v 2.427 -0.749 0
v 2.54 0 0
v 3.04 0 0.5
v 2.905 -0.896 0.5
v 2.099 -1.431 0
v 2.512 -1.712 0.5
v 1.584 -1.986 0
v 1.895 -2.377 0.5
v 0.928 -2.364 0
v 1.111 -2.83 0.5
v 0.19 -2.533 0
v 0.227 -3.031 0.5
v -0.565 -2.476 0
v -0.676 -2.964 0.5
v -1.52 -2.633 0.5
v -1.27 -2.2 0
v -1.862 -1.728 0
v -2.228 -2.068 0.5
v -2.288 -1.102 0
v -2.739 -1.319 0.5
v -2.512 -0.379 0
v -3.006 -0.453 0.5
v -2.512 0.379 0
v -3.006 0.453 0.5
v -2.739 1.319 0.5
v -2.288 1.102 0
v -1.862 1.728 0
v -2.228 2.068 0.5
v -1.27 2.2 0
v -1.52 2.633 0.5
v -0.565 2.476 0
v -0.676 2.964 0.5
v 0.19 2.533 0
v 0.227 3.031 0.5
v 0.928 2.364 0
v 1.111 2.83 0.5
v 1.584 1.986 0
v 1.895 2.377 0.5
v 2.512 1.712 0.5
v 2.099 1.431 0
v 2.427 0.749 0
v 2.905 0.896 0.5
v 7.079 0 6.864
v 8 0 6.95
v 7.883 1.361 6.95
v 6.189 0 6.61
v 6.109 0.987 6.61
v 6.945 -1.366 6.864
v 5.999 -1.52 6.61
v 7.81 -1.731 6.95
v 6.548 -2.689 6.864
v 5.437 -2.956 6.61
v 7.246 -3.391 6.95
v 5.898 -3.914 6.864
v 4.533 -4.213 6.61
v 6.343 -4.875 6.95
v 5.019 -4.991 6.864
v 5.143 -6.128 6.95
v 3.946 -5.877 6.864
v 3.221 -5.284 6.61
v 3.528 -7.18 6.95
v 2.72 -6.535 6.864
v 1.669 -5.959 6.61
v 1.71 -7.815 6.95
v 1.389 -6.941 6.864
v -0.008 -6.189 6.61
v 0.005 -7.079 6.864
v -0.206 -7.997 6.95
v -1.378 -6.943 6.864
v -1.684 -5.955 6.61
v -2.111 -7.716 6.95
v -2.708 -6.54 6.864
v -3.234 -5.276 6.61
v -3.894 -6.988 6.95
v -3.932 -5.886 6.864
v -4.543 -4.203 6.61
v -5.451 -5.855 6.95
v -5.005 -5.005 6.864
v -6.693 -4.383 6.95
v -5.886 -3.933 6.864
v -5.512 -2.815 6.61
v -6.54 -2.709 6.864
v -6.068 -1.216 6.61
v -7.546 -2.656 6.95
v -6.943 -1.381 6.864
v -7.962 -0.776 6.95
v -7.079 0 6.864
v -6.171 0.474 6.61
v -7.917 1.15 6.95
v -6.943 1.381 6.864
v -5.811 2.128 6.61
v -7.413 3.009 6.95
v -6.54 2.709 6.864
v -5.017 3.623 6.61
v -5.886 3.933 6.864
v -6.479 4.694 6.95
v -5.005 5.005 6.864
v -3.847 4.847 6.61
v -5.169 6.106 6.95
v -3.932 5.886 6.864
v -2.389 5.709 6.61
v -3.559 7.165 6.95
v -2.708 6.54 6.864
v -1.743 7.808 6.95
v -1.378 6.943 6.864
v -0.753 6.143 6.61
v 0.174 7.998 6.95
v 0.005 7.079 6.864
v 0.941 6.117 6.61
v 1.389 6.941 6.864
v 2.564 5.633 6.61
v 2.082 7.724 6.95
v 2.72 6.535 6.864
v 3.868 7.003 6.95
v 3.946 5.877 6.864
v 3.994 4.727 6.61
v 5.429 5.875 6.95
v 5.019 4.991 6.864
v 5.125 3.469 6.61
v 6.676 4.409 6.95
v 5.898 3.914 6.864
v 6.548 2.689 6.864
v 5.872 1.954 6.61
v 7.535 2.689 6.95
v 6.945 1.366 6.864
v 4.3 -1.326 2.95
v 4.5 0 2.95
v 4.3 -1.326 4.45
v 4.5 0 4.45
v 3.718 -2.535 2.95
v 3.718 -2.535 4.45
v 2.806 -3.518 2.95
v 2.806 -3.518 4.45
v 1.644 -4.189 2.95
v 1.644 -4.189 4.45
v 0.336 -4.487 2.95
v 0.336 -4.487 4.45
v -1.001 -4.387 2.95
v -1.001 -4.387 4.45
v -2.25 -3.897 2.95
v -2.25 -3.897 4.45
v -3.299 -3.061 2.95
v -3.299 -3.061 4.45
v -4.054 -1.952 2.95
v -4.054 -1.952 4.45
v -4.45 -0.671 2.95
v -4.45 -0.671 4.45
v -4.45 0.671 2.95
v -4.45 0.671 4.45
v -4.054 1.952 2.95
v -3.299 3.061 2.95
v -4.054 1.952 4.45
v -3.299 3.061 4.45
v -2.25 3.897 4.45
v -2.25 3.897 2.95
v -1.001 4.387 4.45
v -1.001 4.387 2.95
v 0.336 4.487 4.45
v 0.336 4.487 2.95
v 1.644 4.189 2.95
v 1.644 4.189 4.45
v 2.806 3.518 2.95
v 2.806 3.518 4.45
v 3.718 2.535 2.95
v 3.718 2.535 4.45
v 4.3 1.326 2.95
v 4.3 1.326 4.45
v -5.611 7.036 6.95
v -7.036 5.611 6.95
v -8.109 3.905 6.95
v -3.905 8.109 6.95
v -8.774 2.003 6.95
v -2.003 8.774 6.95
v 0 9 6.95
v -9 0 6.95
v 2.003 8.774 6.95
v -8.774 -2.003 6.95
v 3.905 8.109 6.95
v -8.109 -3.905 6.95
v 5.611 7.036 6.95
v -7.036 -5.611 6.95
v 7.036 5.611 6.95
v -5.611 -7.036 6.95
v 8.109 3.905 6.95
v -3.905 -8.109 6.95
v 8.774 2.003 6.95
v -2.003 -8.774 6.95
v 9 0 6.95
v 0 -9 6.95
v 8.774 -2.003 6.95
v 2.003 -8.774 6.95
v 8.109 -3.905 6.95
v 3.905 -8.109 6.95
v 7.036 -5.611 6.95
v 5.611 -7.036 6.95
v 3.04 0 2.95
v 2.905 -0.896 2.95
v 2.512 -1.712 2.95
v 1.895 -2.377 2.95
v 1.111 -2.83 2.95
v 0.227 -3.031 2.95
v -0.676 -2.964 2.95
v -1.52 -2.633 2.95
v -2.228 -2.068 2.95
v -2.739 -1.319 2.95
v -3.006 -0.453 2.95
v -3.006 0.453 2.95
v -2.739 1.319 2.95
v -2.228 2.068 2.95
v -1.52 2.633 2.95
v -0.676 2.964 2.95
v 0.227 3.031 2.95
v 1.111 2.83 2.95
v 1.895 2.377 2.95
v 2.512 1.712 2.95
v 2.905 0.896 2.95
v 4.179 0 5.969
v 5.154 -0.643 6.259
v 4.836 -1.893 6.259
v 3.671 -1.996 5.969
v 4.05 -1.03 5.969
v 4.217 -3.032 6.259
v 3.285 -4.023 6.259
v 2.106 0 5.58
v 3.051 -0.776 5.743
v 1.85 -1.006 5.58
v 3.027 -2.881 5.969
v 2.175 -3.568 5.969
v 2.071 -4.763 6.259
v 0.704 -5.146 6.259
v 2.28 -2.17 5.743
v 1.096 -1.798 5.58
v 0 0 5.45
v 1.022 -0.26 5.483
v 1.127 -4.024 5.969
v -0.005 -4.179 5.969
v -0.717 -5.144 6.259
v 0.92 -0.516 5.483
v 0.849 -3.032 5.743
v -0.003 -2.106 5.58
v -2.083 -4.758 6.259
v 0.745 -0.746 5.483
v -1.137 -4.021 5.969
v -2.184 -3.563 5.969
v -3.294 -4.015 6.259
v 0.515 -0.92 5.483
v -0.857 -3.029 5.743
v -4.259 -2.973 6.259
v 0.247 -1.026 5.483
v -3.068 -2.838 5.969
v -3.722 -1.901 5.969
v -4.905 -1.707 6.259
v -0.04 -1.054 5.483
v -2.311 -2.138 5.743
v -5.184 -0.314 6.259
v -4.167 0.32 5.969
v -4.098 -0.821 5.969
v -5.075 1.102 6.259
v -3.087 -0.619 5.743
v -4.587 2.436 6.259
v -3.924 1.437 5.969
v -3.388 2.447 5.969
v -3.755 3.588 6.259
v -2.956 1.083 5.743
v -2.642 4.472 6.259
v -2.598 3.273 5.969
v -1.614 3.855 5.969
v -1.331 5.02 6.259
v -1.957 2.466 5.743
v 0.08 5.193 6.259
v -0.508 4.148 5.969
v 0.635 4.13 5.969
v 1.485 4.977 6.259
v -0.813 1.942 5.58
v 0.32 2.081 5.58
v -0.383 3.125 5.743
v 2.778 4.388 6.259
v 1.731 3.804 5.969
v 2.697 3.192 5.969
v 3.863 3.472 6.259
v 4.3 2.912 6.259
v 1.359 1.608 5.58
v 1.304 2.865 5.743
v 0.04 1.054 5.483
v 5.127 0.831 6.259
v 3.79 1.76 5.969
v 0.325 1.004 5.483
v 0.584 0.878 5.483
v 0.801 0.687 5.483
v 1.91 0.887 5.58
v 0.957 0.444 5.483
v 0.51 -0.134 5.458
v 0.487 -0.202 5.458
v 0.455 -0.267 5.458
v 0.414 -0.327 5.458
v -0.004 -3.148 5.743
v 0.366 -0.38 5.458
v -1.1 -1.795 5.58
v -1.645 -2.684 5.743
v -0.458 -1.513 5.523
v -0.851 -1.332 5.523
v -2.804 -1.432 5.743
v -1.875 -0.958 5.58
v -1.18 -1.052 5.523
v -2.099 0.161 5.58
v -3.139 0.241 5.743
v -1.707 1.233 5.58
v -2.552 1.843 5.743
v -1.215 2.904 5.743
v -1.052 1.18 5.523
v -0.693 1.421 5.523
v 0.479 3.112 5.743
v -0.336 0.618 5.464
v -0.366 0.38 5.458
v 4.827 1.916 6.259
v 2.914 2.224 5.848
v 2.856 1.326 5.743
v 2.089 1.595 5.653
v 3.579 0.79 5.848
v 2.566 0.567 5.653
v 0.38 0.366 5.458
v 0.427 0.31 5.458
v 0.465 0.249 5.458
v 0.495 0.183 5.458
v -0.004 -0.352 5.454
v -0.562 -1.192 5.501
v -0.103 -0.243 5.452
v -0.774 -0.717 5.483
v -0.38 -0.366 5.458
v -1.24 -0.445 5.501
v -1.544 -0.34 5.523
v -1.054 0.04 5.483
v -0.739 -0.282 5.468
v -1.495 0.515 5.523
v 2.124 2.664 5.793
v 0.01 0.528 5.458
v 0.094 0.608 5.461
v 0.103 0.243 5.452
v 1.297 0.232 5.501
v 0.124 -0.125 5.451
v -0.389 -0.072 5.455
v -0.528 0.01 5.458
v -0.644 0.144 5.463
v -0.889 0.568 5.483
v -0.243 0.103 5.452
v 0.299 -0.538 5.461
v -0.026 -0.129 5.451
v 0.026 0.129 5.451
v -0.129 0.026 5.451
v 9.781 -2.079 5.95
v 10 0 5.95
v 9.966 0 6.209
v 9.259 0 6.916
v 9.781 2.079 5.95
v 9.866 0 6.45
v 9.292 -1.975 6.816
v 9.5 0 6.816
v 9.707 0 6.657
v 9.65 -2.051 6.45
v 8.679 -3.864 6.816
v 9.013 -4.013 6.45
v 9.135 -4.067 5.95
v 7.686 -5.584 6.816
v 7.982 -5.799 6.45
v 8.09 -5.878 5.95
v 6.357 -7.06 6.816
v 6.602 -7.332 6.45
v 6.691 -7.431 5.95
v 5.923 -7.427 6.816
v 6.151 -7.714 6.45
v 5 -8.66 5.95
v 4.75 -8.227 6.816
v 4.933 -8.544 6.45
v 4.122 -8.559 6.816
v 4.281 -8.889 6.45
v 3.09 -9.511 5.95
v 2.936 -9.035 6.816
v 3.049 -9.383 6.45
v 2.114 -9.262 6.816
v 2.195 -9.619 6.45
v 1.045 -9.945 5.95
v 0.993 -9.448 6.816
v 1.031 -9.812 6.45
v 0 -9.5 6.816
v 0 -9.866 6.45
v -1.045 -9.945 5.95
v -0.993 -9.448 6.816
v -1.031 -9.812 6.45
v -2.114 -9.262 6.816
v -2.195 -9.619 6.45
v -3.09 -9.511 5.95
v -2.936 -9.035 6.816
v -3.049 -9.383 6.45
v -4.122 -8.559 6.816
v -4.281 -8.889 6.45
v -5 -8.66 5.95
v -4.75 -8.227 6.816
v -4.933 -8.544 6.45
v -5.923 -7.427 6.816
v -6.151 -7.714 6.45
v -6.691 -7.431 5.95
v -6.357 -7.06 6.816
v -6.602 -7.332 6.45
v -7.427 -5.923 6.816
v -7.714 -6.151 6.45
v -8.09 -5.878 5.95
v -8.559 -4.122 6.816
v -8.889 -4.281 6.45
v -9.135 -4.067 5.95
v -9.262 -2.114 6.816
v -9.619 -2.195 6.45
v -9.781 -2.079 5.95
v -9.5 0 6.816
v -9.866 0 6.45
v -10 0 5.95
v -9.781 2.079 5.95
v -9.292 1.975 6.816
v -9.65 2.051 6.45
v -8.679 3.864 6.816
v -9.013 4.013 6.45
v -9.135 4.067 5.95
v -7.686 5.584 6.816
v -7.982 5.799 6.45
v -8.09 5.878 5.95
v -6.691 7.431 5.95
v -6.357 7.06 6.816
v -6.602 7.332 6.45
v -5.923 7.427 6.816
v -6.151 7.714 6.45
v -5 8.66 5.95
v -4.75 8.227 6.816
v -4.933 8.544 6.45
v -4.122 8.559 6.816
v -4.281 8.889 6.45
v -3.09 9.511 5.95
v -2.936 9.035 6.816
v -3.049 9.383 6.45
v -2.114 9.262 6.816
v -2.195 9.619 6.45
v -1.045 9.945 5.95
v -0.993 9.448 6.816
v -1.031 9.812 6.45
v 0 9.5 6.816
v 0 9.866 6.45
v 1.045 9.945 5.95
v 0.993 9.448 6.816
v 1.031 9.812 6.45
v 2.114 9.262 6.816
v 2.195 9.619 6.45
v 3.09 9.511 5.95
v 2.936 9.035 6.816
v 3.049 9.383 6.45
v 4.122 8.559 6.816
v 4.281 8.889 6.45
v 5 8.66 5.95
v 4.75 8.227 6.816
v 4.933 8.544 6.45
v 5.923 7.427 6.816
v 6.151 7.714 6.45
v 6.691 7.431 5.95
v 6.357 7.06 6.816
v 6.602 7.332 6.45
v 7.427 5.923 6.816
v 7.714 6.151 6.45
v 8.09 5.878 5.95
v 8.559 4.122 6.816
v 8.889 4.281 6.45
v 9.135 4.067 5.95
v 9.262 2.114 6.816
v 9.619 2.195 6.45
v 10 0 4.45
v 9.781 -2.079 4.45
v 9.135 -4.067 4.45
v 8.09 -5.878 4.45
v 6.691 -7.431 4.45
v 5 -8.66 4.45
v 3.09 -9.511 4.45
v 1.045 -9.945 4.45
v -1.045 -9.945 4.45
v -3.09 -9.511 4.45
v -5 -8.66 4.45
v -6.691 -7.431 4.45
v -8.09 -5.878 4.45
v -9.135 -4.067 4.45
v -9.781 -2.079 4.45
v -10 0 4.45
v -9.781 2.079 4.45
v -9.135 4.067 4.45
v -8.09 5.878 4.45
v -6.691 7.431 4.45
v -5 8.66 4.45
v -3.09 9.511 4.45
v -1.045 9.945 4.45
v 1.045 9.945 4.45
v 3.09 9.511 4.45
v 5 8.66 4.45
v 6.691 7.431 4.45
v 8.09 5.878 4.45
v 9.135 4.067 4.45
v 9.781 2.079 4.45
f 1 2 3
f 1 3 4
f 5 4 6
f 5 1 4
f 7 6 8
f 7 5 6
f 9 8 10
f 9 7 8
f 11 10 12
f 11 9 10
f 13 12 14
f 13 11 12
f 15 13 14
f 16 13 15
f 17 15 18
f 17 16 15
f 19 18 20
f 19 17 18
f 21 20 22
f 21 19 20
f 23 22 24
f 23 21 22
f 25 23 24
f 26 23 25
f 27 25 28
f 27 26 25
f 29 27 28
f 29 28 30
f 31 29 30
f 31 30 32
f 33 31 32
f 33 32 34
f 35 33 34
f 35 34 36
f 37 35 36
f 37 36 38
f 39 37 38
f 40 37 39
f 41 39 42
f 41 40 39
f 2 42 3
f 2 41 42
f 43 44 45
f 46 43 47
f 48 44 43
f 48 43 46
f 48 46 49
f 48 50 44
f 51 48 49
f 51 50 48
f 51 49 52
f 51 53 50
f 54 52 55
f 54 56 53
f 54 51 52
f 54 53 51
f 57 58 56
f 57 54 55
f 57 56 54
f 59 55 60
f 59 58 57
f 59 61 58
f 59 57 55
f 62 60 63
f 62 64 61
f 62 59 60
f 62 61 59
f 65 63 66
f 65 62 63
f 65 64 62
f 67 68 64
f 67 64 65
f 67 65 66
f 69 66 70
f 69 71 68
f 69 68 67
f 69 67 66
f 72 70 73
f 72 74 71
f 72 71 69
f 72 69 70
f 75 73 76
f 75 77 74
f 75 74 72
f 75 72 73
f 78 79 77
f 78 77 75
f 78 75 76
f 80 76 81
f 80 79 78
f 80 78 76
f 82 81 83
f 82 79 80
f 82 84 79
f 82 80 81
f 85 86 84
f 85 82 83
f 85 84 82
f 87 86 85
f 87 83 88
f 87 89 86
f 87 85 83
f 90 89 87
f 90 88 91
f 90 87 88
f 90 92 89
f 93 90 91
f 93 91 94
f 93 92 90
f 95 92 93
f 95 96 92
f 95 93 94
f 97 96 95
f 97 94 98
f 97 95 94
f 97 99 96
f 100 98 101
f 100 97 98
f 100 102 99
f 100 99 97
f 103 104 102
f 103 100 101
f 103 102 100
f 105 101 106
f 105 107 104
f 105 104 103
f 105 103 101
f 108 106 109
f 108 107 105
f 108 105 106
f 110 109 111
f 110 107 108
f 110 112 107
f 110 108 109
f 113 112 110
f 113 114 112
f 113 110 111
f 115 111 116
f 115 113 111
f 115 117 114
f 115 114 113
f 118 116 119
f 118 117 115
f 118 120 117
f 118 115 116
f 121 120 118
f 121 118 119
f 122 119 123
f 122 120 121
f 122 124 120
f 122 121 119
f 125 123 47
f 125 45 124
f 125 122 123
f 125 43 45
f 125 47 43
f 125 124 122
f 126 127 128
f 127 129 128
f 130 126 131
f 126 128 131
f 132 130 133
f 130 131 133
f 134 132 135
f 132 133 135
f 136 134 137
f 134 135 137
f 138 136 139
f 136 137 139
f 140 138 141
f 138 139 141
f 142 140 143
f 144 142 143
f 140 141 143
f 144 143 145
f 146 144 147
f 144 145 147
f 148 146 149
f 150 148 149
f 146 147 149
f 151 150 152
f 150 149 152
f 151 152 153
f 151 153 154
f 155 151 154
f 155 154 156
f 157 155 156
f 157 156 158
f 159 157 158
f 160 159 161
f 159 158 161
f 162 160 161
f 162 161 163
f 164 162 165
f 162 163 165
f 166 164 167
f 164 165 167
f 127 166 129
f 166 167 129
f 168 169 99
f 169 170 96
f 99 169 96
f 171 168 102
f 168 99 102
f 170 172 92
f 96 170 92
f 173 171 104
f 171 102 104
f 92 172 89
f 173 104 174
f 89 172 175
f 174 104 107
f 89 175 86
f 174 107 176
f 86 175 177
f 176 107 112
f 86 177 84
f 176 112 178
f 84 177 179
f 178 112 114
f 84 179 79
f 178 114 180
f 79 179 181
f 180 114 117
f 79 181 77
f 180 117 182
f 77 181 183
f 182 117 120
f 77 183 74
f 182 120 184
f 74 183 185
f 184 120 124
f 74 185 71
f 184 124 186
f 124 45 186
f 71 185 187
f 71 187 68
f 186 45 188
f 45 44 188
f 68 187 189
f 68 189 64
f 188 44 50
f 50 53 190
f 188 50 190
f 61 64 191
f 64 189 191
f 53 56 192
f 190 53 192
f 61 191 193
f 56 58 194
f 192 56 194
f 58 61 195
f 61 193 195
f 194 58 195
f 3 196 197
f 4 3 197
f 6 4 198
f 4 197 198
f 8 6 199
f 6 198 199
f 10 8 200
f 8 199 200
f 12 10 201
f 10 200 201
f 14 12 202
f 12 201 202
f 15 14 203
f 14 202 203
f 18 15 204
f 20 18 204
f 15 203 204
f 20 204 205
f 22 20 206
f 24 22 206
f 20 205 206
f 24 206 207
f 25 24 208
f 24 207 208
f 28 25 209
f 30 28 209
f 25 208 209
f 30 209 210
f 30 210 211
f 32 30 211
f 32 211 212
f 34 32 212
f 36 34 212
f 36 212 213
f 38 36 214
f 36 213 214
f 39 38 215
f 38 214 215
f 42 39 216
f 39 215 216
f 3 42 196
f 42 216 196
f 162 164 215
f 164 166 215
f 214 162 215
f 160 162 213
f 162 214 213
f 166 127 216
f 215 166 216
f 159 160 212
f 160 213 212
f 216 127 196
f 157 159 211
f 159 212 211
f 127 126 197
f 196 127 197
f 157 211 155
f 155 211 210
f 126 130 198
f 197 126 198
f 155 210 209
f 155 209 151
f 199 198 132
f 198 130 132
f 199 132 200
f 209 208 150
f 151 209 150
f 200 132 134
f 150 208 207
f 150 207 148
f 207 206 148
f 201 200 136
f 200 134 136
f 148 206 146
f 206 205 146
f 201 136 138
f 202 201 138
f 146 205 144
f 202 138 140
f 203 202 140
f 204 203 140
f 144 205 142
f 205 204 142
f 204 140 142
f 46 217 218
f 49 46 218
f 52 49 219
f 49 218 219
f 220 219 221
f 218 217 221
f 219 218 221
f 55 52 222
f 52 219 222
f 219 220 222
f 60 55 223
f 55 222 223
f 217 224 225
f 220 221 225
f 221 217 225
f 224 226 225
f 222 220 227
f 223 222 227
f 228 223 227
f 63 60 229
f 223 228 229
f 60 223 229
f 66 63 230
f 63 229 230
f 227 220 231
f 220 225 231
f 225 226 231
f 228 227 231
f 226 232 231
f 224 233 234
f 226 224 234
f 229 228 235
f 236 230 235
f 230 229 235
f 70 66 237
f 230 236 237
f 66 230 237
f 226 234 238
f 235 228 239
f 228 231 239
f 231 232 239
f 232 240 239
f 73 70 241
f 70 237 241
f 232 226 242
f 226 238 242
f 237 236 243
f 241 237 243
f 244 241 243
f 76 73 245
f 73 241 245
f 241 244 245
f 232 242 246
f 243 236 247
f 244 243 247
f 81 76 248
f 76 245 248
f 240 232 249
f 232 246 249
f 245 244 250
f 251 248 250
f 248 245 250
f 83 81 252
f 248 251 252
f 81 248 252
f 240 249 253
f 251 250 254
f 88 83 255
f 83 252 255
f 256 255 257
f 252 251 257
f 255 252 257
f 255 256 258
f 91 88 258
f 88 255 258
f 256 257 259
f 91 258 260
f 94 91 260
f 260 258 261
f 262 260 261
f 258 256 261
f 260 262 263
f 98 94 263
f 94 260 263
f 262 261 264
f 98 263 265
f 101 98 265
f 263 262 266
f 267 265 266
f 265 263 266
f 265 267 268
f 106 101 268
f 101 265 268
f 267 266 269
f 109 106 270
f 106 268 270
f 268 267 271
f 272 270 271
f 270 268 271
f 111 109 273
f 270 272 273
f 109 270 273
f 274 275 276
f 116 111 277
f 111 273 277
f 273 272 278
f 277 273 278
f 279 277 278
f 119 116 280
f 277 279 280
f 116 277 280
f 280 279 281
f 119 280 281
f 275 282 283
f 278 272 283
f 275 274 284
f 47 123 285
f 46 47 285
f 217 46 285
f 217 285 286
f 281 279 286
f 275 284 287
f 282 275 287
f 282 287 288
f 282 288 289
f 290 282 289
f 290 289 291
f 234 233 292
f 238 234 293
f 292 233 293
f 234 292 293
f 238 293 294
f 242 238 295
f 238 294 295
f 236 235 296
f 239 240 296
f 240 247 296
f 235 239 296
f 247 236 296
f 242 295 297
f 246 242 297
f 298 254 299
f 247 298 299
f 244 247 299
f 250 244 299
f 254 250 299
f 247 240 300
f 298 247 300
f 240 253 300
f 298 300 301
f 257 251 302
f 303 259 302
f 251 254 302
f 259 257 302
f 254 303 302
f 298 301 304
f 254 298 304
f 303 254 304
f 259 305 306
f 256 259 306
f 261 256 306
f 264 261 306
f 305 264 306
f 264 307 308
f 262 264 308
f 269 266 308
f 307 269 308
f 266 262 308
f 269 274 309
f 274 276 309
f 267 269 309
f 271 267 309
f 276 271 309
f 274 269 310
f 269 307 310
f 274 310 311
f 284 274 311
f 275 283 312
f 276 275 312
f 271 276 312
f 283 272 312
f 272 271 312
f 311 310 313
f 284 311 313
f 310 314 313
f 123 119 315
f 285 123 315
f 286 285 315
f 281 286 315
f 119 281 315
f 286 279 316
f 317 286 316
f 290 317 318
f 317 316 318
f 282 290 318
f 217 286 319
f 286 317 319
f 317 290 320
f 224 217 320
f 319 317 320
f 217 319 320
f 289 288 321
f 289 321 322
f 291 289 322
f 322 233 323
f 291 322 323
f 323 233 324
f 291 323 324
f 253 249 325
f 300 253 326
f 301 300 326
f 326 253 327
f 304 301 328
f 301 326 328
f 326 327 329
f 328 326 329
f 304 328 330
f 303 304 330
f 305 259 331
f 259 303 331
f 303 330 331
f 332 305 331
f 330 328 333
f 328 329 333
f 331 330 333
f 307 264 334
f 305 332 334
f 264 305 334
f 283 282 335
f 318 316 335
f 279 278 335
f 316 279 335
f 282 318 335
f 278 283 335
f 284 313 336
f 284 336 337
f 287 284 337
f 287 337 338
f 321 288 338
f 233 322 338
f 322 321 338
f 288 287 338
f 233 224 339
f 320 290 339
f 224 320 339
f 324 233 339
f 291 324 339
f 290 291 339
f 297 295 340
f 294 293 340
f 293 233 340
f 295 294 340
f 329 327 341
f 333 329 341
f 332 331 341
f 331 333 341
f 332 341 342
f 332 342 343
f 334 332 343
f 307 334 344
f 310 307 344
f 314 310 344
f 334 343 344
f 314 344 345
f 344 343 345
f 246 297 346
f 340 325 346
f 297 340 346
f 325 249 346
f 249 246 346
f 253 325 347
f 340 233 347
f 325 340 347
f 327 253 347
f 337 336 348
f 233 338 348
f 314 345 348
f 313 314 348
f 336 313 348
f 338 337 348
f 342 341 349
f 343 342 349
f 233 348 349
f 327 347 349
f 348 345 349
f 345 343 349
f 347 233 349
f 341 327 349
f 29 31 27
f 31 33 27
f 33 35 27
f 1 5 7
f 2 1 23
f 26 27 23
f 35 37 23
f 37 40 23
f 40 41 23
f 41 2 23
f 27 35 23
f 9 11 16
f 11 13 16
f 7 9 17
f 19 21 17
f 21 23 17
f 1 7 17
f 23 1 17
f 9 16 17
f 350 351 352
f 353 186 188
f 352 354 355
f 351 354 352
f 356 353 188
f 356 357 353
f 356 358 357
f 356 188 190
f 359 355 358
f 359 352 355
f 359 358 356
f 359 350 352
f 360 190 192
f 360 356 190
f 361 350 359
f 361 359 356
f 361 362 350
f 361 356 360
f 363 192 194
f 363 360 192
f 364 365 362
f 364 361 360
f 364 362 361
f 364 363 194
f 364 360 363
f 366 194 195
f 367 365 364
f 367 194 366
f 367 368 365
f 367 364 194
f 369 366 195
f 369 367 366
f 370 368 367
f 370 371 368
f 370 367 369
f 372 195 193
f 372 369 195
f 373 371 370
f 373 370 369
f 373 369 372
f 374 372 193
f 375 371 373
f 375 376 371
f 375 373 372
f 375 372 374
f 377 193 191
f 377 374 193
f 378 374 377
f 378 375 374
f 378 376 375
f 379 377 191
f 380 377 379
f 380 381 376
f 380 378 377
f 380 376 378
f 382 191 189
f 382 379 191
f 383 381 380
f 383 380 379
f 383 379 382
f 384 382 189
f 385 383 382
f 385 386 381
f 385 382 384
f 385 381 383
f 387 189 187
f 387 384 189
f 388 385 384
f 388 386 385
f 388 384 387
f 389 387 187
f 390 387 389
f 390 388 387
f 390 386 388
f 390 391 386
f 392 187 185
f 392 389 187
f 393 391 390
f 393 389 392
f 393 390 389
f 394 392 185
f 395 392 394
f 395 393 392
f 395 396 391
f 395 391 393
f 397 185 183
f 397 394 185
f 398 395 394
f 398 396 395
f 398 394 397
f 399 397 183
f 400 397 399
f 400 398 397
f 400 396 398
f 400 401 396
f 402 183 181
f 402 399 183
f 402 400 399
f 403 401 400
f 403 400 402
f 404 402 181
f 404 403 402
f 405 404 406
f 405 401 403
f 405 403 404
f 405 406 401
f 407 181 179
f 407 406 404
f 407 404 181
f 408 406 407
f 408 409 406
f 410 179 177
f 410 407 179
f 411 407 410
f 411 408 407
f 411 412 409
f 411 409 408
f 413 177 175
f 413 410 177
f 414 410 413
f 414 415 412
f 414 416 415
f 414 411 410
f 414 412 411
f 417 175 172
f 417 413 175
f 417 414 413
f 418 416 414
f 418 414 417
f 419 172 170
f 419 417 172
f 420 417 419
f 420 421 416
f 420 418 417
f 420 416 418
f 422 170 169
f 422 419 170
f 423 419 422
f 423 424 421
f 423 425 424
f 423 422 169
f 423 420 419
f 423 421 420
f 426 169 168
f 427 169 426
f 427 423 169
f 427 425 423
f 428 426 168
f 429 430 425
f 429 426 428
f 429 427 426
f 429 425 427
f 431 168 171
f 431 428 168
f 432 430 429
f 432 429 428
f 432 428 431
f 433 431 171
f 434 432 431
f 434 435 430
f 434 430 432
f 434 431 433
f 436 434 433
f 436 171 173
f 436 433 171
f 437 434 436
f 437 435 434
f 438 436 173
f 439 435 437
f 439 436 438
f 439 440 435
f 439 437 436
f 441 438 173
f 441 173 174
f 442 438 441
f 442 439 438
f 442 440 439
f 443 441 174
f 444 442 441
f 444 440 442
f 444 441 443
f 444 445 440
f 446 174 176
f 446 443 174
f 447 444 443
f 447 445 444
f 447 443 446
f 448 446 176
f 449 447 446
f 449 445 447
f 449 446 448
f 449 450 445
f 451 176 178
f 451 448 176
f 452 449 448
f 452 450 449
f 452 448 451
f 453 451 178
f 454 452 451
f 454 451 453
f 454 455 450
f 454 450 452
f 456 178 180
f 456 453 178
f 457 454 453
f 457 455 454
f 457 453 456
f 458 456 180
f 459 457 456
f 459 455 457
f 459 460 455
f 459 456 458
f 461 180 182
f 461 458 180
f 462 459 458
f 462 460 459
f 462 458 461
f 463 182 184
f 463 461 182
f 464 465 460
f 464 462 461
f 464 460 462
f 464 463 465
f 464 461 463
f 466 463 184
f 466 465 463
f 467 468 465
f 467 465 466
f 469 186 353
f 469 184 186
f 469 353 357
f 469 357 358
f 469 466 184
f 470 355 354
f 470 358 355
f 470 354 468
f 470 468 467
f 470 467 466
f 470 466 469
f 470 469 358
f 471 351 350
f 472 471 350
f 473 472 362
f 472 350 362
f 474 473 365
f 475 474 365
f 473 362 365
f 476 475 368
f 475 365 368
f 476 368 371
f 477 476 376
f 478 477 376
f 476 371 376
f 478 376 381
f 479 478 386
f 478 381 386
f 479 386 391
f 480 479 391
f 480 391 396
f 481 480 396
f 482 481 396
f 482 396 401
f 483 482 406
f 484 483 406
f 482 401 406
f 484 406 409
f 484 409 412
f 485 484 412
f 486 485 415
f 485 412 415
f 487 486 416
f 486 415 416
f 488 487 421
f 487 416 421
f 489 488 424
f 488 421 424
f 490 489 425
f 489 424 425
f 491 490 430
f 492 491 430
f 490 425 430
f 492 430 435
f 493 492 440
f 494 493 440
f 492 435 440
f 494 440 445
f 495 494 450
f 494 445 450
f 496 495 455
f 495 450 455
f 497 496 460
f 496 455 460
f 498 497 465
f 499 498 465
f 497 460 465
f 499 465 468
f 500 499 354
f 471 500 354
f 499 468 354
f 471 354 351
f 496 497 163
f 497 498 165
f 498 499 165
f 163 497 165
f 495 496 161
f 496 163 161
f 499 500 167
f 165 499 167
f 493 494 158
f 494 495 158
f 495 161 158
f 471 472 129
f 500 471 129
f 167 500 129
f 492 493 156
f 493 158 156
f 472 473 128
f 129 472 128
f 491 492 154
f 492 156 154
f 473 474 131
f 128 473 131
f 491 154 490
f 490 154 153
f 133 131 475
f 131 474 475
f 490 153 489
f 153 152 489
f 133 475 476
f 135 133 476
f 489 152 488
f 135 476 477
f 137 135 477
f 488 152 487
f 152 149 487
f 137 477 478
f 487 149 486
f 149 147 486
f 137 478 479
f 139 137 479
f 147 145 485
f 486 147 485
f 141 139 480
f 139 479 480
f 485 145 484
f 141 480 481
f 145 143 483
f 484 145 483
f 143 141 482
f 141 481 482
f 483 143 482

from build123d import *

# Parameters (mm, degrees)
F2_R    = 5
F3_R    = 1
F4_SIZE = 0.5


with BuildPart() as f1:
    # F0 (on Front) → F1 (revolve)
    with BuildSketch(Plane.XZ):
        with BuildLine():
            Line((0, 5.45), (0, 0))
            Line((0, 0), (3.04, 0))
            Line((3.04, 0), (3.04, 2.95))
            Line((3.04, 2.95), (4.5, 2.95))
            Line((4.5, 2.95), (4.5, 4.45))
            Line((4.5, 4.45), (10, 4.45))
            Line((10, 4.45), (10, 6.95))
            Line((10, 6.95), (7, 6.95))
            ThreePointArc((7, 6.95), (3.579455, 5.829209), (0, 5.45))
        make_face()
    revolve(axis=Axis((0, 0, 3.81847), (0, 0, -1)))

    # F2
    f2_edges = [f1.edges().sort_by_distance(p)[0] for p in [
        (-7, 0, 6.95),
    ]]
    fillet(f2_edges, radius=F2_R)

    # F3
    f3_edges = [f1.edges().sort_by_distance(p)[0] for p in [
        (-10, 0, 6.95),
    ]]
    fillet(f3_edges, radius=F3_R)

    # F4
    f4_edges = [f1.edges().sort_by_distance(p)[0] for p in [
        (-3.04, 0, 0),
    ]]
    chamfer(f4_edges, length=F4_SIZE)


solid = f1.part
